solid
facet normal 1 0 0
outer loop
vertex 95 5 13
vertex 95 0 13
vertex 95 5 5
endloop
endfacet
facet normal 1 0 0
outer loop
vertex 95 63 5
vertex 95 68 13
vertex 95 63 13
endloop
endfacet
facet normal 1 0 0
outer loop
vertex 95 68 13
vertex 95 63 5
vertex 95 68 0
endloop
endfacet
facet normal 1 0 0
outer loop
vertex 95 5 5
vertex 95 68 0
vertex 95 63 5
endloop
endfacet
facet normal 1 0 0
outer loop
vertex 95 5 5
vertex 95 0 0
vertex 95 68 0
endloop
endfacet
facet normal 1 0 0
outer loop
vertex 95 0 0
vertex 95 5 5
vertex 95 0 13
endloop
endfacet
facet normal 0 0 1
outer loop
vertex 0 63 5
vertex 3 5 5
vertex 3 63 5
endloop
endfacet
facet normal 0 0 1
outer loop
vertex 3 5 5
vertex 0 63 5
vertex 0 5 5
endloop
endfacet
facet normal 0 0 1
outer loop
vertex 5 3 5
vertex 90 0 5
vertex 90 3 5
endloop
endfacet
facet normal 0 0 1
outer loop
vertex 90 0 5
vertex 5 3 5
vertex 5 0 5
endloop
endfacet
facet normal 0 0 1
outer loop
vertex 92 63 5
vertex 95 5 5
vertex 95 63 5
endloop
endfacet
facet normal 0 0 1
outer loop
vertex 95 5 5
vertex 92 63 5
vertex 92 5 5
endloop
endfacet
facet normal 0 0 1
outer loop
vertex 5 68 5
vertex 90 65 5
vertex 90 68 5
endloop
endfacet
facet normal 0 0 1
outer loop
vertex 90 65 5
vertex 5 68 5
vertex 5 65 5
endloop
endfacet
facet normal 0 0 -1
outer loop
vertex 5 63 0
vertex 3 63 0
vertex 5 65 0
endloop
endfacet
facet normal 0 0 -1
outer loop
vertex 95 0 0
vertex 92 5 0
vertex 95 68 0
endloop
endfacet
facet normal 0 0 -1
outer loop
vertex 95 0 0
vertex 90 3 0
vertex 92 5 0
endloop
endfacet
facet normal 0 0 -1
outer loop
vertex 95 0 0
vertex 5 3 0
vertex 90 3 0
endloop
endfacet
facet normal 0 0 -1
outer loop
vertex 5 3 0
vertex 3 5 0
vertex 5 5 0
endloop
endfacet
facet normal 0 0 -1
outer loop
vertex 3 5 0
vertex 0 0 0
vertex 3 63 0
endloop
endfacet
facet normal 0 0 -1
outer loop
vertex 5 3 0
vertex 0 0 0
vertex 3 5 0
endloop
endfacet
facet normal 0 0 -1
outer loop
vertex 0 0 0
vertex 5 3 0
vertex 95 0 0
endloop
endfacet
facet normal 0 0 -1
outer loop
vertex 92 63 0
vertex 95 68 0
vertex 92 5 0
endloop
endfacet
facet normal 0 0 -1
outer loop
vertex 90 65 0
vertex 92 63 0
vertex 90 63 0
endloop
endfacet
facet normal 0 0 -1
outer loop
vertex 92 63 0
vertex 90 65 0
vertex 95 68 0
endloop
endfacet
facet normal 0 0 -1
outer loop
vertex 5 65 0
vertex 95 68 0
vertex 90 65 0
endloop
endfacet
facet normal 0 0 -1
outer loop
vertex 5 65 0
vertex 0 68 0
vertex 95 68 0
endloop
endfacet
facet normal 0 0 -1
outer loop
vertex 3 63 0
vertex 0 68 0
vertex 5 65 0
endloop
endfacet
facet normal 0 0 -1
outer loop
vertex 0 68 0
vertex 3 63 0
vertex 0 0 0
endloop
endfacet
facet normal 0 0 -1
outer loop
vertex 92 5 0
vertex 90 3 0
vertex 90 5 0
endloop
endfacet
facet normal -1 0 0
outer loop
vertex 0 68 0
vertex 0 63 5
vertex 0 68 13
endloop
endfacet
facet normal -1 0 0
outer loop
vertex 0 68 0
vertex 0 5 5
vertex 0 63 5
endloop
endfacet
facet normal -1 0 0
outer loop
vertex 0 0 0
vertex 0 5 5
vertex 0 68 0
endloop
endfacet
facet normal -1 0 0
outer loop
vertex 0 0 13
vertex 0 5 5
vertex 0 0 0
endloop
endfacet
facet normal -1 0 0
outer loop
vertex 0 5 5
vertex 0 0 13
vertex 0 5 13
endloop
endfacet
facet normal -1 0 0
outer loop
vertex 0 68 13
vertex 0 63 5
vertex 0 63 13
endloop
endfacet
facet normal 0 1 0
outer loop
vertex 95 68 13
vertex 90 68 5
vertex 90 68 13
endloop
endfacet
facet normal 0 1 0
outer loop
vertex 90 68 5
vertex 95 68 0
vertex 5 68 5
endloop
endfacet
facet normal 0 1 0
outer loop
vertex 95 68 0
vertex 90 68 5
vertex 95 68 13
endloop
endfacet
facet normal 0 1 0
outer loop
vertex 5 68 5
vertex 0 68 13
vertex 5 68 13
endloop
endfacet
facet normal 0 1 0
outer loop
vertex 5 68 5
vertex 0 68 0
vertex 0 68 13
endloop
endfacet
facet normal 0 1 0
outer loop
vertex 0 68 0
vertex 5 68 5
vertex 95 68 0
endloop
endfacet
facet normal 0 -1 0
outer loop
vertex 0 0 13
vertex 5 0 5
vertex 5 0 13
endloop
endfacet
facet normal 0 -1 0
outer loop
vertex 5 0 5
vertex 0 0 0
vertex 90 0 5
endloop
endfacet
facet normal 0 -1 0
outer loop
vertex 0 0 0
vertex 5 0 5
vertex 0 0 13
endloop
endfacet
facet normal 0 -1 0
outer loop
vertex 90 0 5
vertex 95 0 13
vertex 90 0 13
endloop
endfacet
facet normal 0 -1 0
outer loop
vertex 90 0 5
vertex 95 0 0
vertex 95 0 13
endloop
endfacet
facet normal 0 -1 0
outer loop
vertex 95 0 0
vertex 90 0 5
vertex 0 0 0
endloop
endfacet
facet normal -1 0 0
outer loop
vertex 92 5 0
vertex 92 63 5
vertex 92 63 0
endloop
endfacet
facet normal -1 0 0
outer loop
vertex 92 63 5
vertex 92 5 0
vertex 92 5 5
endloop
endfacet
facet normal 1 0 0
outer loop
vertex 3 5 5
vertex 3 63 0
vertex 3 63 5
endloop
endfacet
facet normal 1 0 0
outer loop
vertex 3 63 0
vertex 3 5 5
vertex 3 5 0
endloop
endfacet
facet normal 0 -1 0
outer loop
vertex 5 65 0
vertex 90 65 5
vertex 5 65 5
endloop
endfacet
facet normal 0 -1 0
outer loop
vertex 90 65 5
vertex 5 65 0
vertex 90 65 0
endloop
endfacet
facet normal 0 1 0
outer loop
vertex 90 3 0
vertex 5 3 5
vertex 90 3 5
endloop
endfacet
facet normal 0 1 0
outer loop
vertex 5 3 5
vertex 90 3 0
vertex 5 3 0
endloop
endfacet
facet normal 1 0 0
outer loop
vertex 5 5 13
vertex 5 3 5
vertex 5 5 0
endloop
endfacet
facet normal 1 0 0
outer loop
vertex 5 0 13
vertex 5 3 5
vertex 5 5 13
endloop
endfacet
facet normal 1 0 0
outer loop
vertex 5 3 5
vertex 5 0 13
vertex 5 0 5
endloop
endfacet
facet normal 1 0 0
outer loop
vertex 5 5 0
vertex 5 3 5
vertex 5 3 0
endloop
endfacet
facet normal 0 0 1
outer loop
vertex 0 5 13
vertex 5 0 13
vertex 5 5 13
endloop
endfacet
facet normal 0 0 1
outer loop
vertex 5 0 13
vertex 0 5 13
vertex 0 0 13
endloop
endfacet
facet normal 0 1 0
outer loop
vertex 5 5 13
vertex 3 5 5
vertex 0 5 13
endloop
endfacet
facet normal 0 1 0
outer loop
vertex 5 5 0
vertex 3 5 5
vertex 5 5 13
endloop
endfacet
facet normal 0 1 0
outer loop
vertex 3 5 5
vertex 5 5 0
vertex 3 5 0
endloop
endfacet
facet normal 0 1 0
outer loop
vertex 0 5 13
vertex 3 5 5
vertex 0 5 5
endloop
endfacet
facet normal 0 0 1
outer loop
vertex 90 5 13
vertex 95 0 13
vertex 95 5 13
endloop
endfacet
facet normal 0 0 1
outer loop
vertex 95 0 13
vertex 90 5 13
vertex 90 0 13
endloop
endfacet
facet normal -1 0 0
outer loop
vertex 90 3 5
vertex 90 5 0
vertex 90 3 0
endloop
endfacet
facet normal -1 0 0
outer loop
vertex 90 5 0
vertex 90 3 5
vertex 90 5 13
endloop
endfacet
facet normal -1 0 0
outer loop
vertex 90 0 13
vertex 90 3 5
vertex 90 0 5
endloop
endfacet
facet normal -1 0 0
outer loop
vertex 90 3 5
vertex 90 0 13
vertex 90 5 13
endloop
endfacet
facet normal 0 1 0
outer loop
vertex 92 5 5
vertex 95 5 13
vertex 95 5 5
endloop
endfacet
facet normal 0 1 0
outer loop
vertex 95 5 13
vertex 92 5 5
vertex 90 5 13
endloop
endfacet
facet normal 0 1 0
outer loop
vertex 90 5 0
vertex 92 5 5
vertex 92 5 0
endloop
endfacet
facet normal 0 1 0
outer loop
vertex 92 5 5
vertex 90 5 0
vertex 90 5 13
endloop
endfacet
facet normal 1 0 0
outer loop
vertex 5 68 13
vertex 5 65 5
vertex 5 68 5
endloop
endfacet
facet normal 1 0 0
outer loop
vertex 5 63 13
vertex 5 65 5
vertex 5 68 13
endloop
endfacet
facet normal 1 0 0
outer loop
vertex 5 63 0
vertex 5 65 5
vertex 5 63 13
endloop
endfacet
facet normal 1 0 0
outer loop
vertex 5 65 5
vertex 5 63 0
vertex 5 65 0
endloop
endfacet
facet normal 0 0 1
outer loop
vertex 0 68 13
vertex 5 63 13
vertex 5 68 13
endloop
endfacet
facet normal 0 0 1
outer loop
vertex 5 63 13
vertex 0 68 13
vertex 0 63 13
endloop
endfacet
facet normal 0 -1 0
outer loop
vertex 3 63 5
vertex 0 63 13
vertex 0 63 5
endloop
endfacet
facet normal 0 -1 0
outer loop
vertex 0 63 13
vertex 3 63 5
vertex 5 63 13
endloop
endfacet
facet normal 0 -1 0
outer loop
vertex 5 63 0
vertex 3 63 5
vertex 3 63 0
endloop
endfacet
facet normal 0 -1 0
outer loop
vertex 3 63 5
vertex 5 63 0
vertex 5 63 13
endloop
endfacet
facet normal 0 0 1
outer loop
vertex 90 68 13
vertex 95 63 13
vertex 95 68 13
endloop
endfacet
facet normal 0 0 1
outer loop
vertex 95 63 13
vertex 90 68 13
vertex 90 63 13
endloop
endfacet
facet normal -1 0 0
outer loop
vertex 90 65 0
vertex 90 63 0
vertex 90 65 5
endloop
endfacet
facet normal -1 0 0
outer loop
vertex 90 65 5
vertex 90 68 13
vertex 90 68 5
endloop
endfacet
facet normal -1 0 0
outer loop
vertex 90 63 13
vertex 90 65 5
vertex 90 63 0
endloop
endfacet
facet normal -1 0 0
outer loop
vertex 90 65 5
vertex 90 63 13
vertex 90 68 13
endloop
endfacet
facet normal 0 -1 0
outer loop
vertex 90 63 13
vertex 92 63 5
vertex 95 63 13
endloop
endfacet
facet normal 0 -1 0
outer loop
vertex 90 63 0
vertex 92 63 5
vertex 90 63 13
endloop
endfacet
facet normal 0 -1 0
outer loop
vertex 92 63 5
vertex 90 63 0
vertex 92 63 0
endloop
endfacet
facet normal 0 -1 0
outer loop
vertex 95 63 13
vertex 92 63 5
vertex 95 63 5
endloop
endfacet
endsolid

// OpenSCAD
BoxH=5;
BoxW=91;
BoxD=64;

Wall=4;
Hole=2;
Space=1;
cs=Hole+Space;
DW=Wall*2;
csWall=cs+Wall;
TopY=BoxD-DW;
MaxX=BoxW-DW;

difference()
{
  cube([95,68,5]);
  translate([3,3,-1]) cube([89,62,6.1]);
}
translate([0,0,0]) cube([5,5,13]);
translate([90,0,0]) cube([5,5,13]);
translate([0,63,0]) cube([5,5,13]);
translate([90,63,0]) cube([5,5,13]);
